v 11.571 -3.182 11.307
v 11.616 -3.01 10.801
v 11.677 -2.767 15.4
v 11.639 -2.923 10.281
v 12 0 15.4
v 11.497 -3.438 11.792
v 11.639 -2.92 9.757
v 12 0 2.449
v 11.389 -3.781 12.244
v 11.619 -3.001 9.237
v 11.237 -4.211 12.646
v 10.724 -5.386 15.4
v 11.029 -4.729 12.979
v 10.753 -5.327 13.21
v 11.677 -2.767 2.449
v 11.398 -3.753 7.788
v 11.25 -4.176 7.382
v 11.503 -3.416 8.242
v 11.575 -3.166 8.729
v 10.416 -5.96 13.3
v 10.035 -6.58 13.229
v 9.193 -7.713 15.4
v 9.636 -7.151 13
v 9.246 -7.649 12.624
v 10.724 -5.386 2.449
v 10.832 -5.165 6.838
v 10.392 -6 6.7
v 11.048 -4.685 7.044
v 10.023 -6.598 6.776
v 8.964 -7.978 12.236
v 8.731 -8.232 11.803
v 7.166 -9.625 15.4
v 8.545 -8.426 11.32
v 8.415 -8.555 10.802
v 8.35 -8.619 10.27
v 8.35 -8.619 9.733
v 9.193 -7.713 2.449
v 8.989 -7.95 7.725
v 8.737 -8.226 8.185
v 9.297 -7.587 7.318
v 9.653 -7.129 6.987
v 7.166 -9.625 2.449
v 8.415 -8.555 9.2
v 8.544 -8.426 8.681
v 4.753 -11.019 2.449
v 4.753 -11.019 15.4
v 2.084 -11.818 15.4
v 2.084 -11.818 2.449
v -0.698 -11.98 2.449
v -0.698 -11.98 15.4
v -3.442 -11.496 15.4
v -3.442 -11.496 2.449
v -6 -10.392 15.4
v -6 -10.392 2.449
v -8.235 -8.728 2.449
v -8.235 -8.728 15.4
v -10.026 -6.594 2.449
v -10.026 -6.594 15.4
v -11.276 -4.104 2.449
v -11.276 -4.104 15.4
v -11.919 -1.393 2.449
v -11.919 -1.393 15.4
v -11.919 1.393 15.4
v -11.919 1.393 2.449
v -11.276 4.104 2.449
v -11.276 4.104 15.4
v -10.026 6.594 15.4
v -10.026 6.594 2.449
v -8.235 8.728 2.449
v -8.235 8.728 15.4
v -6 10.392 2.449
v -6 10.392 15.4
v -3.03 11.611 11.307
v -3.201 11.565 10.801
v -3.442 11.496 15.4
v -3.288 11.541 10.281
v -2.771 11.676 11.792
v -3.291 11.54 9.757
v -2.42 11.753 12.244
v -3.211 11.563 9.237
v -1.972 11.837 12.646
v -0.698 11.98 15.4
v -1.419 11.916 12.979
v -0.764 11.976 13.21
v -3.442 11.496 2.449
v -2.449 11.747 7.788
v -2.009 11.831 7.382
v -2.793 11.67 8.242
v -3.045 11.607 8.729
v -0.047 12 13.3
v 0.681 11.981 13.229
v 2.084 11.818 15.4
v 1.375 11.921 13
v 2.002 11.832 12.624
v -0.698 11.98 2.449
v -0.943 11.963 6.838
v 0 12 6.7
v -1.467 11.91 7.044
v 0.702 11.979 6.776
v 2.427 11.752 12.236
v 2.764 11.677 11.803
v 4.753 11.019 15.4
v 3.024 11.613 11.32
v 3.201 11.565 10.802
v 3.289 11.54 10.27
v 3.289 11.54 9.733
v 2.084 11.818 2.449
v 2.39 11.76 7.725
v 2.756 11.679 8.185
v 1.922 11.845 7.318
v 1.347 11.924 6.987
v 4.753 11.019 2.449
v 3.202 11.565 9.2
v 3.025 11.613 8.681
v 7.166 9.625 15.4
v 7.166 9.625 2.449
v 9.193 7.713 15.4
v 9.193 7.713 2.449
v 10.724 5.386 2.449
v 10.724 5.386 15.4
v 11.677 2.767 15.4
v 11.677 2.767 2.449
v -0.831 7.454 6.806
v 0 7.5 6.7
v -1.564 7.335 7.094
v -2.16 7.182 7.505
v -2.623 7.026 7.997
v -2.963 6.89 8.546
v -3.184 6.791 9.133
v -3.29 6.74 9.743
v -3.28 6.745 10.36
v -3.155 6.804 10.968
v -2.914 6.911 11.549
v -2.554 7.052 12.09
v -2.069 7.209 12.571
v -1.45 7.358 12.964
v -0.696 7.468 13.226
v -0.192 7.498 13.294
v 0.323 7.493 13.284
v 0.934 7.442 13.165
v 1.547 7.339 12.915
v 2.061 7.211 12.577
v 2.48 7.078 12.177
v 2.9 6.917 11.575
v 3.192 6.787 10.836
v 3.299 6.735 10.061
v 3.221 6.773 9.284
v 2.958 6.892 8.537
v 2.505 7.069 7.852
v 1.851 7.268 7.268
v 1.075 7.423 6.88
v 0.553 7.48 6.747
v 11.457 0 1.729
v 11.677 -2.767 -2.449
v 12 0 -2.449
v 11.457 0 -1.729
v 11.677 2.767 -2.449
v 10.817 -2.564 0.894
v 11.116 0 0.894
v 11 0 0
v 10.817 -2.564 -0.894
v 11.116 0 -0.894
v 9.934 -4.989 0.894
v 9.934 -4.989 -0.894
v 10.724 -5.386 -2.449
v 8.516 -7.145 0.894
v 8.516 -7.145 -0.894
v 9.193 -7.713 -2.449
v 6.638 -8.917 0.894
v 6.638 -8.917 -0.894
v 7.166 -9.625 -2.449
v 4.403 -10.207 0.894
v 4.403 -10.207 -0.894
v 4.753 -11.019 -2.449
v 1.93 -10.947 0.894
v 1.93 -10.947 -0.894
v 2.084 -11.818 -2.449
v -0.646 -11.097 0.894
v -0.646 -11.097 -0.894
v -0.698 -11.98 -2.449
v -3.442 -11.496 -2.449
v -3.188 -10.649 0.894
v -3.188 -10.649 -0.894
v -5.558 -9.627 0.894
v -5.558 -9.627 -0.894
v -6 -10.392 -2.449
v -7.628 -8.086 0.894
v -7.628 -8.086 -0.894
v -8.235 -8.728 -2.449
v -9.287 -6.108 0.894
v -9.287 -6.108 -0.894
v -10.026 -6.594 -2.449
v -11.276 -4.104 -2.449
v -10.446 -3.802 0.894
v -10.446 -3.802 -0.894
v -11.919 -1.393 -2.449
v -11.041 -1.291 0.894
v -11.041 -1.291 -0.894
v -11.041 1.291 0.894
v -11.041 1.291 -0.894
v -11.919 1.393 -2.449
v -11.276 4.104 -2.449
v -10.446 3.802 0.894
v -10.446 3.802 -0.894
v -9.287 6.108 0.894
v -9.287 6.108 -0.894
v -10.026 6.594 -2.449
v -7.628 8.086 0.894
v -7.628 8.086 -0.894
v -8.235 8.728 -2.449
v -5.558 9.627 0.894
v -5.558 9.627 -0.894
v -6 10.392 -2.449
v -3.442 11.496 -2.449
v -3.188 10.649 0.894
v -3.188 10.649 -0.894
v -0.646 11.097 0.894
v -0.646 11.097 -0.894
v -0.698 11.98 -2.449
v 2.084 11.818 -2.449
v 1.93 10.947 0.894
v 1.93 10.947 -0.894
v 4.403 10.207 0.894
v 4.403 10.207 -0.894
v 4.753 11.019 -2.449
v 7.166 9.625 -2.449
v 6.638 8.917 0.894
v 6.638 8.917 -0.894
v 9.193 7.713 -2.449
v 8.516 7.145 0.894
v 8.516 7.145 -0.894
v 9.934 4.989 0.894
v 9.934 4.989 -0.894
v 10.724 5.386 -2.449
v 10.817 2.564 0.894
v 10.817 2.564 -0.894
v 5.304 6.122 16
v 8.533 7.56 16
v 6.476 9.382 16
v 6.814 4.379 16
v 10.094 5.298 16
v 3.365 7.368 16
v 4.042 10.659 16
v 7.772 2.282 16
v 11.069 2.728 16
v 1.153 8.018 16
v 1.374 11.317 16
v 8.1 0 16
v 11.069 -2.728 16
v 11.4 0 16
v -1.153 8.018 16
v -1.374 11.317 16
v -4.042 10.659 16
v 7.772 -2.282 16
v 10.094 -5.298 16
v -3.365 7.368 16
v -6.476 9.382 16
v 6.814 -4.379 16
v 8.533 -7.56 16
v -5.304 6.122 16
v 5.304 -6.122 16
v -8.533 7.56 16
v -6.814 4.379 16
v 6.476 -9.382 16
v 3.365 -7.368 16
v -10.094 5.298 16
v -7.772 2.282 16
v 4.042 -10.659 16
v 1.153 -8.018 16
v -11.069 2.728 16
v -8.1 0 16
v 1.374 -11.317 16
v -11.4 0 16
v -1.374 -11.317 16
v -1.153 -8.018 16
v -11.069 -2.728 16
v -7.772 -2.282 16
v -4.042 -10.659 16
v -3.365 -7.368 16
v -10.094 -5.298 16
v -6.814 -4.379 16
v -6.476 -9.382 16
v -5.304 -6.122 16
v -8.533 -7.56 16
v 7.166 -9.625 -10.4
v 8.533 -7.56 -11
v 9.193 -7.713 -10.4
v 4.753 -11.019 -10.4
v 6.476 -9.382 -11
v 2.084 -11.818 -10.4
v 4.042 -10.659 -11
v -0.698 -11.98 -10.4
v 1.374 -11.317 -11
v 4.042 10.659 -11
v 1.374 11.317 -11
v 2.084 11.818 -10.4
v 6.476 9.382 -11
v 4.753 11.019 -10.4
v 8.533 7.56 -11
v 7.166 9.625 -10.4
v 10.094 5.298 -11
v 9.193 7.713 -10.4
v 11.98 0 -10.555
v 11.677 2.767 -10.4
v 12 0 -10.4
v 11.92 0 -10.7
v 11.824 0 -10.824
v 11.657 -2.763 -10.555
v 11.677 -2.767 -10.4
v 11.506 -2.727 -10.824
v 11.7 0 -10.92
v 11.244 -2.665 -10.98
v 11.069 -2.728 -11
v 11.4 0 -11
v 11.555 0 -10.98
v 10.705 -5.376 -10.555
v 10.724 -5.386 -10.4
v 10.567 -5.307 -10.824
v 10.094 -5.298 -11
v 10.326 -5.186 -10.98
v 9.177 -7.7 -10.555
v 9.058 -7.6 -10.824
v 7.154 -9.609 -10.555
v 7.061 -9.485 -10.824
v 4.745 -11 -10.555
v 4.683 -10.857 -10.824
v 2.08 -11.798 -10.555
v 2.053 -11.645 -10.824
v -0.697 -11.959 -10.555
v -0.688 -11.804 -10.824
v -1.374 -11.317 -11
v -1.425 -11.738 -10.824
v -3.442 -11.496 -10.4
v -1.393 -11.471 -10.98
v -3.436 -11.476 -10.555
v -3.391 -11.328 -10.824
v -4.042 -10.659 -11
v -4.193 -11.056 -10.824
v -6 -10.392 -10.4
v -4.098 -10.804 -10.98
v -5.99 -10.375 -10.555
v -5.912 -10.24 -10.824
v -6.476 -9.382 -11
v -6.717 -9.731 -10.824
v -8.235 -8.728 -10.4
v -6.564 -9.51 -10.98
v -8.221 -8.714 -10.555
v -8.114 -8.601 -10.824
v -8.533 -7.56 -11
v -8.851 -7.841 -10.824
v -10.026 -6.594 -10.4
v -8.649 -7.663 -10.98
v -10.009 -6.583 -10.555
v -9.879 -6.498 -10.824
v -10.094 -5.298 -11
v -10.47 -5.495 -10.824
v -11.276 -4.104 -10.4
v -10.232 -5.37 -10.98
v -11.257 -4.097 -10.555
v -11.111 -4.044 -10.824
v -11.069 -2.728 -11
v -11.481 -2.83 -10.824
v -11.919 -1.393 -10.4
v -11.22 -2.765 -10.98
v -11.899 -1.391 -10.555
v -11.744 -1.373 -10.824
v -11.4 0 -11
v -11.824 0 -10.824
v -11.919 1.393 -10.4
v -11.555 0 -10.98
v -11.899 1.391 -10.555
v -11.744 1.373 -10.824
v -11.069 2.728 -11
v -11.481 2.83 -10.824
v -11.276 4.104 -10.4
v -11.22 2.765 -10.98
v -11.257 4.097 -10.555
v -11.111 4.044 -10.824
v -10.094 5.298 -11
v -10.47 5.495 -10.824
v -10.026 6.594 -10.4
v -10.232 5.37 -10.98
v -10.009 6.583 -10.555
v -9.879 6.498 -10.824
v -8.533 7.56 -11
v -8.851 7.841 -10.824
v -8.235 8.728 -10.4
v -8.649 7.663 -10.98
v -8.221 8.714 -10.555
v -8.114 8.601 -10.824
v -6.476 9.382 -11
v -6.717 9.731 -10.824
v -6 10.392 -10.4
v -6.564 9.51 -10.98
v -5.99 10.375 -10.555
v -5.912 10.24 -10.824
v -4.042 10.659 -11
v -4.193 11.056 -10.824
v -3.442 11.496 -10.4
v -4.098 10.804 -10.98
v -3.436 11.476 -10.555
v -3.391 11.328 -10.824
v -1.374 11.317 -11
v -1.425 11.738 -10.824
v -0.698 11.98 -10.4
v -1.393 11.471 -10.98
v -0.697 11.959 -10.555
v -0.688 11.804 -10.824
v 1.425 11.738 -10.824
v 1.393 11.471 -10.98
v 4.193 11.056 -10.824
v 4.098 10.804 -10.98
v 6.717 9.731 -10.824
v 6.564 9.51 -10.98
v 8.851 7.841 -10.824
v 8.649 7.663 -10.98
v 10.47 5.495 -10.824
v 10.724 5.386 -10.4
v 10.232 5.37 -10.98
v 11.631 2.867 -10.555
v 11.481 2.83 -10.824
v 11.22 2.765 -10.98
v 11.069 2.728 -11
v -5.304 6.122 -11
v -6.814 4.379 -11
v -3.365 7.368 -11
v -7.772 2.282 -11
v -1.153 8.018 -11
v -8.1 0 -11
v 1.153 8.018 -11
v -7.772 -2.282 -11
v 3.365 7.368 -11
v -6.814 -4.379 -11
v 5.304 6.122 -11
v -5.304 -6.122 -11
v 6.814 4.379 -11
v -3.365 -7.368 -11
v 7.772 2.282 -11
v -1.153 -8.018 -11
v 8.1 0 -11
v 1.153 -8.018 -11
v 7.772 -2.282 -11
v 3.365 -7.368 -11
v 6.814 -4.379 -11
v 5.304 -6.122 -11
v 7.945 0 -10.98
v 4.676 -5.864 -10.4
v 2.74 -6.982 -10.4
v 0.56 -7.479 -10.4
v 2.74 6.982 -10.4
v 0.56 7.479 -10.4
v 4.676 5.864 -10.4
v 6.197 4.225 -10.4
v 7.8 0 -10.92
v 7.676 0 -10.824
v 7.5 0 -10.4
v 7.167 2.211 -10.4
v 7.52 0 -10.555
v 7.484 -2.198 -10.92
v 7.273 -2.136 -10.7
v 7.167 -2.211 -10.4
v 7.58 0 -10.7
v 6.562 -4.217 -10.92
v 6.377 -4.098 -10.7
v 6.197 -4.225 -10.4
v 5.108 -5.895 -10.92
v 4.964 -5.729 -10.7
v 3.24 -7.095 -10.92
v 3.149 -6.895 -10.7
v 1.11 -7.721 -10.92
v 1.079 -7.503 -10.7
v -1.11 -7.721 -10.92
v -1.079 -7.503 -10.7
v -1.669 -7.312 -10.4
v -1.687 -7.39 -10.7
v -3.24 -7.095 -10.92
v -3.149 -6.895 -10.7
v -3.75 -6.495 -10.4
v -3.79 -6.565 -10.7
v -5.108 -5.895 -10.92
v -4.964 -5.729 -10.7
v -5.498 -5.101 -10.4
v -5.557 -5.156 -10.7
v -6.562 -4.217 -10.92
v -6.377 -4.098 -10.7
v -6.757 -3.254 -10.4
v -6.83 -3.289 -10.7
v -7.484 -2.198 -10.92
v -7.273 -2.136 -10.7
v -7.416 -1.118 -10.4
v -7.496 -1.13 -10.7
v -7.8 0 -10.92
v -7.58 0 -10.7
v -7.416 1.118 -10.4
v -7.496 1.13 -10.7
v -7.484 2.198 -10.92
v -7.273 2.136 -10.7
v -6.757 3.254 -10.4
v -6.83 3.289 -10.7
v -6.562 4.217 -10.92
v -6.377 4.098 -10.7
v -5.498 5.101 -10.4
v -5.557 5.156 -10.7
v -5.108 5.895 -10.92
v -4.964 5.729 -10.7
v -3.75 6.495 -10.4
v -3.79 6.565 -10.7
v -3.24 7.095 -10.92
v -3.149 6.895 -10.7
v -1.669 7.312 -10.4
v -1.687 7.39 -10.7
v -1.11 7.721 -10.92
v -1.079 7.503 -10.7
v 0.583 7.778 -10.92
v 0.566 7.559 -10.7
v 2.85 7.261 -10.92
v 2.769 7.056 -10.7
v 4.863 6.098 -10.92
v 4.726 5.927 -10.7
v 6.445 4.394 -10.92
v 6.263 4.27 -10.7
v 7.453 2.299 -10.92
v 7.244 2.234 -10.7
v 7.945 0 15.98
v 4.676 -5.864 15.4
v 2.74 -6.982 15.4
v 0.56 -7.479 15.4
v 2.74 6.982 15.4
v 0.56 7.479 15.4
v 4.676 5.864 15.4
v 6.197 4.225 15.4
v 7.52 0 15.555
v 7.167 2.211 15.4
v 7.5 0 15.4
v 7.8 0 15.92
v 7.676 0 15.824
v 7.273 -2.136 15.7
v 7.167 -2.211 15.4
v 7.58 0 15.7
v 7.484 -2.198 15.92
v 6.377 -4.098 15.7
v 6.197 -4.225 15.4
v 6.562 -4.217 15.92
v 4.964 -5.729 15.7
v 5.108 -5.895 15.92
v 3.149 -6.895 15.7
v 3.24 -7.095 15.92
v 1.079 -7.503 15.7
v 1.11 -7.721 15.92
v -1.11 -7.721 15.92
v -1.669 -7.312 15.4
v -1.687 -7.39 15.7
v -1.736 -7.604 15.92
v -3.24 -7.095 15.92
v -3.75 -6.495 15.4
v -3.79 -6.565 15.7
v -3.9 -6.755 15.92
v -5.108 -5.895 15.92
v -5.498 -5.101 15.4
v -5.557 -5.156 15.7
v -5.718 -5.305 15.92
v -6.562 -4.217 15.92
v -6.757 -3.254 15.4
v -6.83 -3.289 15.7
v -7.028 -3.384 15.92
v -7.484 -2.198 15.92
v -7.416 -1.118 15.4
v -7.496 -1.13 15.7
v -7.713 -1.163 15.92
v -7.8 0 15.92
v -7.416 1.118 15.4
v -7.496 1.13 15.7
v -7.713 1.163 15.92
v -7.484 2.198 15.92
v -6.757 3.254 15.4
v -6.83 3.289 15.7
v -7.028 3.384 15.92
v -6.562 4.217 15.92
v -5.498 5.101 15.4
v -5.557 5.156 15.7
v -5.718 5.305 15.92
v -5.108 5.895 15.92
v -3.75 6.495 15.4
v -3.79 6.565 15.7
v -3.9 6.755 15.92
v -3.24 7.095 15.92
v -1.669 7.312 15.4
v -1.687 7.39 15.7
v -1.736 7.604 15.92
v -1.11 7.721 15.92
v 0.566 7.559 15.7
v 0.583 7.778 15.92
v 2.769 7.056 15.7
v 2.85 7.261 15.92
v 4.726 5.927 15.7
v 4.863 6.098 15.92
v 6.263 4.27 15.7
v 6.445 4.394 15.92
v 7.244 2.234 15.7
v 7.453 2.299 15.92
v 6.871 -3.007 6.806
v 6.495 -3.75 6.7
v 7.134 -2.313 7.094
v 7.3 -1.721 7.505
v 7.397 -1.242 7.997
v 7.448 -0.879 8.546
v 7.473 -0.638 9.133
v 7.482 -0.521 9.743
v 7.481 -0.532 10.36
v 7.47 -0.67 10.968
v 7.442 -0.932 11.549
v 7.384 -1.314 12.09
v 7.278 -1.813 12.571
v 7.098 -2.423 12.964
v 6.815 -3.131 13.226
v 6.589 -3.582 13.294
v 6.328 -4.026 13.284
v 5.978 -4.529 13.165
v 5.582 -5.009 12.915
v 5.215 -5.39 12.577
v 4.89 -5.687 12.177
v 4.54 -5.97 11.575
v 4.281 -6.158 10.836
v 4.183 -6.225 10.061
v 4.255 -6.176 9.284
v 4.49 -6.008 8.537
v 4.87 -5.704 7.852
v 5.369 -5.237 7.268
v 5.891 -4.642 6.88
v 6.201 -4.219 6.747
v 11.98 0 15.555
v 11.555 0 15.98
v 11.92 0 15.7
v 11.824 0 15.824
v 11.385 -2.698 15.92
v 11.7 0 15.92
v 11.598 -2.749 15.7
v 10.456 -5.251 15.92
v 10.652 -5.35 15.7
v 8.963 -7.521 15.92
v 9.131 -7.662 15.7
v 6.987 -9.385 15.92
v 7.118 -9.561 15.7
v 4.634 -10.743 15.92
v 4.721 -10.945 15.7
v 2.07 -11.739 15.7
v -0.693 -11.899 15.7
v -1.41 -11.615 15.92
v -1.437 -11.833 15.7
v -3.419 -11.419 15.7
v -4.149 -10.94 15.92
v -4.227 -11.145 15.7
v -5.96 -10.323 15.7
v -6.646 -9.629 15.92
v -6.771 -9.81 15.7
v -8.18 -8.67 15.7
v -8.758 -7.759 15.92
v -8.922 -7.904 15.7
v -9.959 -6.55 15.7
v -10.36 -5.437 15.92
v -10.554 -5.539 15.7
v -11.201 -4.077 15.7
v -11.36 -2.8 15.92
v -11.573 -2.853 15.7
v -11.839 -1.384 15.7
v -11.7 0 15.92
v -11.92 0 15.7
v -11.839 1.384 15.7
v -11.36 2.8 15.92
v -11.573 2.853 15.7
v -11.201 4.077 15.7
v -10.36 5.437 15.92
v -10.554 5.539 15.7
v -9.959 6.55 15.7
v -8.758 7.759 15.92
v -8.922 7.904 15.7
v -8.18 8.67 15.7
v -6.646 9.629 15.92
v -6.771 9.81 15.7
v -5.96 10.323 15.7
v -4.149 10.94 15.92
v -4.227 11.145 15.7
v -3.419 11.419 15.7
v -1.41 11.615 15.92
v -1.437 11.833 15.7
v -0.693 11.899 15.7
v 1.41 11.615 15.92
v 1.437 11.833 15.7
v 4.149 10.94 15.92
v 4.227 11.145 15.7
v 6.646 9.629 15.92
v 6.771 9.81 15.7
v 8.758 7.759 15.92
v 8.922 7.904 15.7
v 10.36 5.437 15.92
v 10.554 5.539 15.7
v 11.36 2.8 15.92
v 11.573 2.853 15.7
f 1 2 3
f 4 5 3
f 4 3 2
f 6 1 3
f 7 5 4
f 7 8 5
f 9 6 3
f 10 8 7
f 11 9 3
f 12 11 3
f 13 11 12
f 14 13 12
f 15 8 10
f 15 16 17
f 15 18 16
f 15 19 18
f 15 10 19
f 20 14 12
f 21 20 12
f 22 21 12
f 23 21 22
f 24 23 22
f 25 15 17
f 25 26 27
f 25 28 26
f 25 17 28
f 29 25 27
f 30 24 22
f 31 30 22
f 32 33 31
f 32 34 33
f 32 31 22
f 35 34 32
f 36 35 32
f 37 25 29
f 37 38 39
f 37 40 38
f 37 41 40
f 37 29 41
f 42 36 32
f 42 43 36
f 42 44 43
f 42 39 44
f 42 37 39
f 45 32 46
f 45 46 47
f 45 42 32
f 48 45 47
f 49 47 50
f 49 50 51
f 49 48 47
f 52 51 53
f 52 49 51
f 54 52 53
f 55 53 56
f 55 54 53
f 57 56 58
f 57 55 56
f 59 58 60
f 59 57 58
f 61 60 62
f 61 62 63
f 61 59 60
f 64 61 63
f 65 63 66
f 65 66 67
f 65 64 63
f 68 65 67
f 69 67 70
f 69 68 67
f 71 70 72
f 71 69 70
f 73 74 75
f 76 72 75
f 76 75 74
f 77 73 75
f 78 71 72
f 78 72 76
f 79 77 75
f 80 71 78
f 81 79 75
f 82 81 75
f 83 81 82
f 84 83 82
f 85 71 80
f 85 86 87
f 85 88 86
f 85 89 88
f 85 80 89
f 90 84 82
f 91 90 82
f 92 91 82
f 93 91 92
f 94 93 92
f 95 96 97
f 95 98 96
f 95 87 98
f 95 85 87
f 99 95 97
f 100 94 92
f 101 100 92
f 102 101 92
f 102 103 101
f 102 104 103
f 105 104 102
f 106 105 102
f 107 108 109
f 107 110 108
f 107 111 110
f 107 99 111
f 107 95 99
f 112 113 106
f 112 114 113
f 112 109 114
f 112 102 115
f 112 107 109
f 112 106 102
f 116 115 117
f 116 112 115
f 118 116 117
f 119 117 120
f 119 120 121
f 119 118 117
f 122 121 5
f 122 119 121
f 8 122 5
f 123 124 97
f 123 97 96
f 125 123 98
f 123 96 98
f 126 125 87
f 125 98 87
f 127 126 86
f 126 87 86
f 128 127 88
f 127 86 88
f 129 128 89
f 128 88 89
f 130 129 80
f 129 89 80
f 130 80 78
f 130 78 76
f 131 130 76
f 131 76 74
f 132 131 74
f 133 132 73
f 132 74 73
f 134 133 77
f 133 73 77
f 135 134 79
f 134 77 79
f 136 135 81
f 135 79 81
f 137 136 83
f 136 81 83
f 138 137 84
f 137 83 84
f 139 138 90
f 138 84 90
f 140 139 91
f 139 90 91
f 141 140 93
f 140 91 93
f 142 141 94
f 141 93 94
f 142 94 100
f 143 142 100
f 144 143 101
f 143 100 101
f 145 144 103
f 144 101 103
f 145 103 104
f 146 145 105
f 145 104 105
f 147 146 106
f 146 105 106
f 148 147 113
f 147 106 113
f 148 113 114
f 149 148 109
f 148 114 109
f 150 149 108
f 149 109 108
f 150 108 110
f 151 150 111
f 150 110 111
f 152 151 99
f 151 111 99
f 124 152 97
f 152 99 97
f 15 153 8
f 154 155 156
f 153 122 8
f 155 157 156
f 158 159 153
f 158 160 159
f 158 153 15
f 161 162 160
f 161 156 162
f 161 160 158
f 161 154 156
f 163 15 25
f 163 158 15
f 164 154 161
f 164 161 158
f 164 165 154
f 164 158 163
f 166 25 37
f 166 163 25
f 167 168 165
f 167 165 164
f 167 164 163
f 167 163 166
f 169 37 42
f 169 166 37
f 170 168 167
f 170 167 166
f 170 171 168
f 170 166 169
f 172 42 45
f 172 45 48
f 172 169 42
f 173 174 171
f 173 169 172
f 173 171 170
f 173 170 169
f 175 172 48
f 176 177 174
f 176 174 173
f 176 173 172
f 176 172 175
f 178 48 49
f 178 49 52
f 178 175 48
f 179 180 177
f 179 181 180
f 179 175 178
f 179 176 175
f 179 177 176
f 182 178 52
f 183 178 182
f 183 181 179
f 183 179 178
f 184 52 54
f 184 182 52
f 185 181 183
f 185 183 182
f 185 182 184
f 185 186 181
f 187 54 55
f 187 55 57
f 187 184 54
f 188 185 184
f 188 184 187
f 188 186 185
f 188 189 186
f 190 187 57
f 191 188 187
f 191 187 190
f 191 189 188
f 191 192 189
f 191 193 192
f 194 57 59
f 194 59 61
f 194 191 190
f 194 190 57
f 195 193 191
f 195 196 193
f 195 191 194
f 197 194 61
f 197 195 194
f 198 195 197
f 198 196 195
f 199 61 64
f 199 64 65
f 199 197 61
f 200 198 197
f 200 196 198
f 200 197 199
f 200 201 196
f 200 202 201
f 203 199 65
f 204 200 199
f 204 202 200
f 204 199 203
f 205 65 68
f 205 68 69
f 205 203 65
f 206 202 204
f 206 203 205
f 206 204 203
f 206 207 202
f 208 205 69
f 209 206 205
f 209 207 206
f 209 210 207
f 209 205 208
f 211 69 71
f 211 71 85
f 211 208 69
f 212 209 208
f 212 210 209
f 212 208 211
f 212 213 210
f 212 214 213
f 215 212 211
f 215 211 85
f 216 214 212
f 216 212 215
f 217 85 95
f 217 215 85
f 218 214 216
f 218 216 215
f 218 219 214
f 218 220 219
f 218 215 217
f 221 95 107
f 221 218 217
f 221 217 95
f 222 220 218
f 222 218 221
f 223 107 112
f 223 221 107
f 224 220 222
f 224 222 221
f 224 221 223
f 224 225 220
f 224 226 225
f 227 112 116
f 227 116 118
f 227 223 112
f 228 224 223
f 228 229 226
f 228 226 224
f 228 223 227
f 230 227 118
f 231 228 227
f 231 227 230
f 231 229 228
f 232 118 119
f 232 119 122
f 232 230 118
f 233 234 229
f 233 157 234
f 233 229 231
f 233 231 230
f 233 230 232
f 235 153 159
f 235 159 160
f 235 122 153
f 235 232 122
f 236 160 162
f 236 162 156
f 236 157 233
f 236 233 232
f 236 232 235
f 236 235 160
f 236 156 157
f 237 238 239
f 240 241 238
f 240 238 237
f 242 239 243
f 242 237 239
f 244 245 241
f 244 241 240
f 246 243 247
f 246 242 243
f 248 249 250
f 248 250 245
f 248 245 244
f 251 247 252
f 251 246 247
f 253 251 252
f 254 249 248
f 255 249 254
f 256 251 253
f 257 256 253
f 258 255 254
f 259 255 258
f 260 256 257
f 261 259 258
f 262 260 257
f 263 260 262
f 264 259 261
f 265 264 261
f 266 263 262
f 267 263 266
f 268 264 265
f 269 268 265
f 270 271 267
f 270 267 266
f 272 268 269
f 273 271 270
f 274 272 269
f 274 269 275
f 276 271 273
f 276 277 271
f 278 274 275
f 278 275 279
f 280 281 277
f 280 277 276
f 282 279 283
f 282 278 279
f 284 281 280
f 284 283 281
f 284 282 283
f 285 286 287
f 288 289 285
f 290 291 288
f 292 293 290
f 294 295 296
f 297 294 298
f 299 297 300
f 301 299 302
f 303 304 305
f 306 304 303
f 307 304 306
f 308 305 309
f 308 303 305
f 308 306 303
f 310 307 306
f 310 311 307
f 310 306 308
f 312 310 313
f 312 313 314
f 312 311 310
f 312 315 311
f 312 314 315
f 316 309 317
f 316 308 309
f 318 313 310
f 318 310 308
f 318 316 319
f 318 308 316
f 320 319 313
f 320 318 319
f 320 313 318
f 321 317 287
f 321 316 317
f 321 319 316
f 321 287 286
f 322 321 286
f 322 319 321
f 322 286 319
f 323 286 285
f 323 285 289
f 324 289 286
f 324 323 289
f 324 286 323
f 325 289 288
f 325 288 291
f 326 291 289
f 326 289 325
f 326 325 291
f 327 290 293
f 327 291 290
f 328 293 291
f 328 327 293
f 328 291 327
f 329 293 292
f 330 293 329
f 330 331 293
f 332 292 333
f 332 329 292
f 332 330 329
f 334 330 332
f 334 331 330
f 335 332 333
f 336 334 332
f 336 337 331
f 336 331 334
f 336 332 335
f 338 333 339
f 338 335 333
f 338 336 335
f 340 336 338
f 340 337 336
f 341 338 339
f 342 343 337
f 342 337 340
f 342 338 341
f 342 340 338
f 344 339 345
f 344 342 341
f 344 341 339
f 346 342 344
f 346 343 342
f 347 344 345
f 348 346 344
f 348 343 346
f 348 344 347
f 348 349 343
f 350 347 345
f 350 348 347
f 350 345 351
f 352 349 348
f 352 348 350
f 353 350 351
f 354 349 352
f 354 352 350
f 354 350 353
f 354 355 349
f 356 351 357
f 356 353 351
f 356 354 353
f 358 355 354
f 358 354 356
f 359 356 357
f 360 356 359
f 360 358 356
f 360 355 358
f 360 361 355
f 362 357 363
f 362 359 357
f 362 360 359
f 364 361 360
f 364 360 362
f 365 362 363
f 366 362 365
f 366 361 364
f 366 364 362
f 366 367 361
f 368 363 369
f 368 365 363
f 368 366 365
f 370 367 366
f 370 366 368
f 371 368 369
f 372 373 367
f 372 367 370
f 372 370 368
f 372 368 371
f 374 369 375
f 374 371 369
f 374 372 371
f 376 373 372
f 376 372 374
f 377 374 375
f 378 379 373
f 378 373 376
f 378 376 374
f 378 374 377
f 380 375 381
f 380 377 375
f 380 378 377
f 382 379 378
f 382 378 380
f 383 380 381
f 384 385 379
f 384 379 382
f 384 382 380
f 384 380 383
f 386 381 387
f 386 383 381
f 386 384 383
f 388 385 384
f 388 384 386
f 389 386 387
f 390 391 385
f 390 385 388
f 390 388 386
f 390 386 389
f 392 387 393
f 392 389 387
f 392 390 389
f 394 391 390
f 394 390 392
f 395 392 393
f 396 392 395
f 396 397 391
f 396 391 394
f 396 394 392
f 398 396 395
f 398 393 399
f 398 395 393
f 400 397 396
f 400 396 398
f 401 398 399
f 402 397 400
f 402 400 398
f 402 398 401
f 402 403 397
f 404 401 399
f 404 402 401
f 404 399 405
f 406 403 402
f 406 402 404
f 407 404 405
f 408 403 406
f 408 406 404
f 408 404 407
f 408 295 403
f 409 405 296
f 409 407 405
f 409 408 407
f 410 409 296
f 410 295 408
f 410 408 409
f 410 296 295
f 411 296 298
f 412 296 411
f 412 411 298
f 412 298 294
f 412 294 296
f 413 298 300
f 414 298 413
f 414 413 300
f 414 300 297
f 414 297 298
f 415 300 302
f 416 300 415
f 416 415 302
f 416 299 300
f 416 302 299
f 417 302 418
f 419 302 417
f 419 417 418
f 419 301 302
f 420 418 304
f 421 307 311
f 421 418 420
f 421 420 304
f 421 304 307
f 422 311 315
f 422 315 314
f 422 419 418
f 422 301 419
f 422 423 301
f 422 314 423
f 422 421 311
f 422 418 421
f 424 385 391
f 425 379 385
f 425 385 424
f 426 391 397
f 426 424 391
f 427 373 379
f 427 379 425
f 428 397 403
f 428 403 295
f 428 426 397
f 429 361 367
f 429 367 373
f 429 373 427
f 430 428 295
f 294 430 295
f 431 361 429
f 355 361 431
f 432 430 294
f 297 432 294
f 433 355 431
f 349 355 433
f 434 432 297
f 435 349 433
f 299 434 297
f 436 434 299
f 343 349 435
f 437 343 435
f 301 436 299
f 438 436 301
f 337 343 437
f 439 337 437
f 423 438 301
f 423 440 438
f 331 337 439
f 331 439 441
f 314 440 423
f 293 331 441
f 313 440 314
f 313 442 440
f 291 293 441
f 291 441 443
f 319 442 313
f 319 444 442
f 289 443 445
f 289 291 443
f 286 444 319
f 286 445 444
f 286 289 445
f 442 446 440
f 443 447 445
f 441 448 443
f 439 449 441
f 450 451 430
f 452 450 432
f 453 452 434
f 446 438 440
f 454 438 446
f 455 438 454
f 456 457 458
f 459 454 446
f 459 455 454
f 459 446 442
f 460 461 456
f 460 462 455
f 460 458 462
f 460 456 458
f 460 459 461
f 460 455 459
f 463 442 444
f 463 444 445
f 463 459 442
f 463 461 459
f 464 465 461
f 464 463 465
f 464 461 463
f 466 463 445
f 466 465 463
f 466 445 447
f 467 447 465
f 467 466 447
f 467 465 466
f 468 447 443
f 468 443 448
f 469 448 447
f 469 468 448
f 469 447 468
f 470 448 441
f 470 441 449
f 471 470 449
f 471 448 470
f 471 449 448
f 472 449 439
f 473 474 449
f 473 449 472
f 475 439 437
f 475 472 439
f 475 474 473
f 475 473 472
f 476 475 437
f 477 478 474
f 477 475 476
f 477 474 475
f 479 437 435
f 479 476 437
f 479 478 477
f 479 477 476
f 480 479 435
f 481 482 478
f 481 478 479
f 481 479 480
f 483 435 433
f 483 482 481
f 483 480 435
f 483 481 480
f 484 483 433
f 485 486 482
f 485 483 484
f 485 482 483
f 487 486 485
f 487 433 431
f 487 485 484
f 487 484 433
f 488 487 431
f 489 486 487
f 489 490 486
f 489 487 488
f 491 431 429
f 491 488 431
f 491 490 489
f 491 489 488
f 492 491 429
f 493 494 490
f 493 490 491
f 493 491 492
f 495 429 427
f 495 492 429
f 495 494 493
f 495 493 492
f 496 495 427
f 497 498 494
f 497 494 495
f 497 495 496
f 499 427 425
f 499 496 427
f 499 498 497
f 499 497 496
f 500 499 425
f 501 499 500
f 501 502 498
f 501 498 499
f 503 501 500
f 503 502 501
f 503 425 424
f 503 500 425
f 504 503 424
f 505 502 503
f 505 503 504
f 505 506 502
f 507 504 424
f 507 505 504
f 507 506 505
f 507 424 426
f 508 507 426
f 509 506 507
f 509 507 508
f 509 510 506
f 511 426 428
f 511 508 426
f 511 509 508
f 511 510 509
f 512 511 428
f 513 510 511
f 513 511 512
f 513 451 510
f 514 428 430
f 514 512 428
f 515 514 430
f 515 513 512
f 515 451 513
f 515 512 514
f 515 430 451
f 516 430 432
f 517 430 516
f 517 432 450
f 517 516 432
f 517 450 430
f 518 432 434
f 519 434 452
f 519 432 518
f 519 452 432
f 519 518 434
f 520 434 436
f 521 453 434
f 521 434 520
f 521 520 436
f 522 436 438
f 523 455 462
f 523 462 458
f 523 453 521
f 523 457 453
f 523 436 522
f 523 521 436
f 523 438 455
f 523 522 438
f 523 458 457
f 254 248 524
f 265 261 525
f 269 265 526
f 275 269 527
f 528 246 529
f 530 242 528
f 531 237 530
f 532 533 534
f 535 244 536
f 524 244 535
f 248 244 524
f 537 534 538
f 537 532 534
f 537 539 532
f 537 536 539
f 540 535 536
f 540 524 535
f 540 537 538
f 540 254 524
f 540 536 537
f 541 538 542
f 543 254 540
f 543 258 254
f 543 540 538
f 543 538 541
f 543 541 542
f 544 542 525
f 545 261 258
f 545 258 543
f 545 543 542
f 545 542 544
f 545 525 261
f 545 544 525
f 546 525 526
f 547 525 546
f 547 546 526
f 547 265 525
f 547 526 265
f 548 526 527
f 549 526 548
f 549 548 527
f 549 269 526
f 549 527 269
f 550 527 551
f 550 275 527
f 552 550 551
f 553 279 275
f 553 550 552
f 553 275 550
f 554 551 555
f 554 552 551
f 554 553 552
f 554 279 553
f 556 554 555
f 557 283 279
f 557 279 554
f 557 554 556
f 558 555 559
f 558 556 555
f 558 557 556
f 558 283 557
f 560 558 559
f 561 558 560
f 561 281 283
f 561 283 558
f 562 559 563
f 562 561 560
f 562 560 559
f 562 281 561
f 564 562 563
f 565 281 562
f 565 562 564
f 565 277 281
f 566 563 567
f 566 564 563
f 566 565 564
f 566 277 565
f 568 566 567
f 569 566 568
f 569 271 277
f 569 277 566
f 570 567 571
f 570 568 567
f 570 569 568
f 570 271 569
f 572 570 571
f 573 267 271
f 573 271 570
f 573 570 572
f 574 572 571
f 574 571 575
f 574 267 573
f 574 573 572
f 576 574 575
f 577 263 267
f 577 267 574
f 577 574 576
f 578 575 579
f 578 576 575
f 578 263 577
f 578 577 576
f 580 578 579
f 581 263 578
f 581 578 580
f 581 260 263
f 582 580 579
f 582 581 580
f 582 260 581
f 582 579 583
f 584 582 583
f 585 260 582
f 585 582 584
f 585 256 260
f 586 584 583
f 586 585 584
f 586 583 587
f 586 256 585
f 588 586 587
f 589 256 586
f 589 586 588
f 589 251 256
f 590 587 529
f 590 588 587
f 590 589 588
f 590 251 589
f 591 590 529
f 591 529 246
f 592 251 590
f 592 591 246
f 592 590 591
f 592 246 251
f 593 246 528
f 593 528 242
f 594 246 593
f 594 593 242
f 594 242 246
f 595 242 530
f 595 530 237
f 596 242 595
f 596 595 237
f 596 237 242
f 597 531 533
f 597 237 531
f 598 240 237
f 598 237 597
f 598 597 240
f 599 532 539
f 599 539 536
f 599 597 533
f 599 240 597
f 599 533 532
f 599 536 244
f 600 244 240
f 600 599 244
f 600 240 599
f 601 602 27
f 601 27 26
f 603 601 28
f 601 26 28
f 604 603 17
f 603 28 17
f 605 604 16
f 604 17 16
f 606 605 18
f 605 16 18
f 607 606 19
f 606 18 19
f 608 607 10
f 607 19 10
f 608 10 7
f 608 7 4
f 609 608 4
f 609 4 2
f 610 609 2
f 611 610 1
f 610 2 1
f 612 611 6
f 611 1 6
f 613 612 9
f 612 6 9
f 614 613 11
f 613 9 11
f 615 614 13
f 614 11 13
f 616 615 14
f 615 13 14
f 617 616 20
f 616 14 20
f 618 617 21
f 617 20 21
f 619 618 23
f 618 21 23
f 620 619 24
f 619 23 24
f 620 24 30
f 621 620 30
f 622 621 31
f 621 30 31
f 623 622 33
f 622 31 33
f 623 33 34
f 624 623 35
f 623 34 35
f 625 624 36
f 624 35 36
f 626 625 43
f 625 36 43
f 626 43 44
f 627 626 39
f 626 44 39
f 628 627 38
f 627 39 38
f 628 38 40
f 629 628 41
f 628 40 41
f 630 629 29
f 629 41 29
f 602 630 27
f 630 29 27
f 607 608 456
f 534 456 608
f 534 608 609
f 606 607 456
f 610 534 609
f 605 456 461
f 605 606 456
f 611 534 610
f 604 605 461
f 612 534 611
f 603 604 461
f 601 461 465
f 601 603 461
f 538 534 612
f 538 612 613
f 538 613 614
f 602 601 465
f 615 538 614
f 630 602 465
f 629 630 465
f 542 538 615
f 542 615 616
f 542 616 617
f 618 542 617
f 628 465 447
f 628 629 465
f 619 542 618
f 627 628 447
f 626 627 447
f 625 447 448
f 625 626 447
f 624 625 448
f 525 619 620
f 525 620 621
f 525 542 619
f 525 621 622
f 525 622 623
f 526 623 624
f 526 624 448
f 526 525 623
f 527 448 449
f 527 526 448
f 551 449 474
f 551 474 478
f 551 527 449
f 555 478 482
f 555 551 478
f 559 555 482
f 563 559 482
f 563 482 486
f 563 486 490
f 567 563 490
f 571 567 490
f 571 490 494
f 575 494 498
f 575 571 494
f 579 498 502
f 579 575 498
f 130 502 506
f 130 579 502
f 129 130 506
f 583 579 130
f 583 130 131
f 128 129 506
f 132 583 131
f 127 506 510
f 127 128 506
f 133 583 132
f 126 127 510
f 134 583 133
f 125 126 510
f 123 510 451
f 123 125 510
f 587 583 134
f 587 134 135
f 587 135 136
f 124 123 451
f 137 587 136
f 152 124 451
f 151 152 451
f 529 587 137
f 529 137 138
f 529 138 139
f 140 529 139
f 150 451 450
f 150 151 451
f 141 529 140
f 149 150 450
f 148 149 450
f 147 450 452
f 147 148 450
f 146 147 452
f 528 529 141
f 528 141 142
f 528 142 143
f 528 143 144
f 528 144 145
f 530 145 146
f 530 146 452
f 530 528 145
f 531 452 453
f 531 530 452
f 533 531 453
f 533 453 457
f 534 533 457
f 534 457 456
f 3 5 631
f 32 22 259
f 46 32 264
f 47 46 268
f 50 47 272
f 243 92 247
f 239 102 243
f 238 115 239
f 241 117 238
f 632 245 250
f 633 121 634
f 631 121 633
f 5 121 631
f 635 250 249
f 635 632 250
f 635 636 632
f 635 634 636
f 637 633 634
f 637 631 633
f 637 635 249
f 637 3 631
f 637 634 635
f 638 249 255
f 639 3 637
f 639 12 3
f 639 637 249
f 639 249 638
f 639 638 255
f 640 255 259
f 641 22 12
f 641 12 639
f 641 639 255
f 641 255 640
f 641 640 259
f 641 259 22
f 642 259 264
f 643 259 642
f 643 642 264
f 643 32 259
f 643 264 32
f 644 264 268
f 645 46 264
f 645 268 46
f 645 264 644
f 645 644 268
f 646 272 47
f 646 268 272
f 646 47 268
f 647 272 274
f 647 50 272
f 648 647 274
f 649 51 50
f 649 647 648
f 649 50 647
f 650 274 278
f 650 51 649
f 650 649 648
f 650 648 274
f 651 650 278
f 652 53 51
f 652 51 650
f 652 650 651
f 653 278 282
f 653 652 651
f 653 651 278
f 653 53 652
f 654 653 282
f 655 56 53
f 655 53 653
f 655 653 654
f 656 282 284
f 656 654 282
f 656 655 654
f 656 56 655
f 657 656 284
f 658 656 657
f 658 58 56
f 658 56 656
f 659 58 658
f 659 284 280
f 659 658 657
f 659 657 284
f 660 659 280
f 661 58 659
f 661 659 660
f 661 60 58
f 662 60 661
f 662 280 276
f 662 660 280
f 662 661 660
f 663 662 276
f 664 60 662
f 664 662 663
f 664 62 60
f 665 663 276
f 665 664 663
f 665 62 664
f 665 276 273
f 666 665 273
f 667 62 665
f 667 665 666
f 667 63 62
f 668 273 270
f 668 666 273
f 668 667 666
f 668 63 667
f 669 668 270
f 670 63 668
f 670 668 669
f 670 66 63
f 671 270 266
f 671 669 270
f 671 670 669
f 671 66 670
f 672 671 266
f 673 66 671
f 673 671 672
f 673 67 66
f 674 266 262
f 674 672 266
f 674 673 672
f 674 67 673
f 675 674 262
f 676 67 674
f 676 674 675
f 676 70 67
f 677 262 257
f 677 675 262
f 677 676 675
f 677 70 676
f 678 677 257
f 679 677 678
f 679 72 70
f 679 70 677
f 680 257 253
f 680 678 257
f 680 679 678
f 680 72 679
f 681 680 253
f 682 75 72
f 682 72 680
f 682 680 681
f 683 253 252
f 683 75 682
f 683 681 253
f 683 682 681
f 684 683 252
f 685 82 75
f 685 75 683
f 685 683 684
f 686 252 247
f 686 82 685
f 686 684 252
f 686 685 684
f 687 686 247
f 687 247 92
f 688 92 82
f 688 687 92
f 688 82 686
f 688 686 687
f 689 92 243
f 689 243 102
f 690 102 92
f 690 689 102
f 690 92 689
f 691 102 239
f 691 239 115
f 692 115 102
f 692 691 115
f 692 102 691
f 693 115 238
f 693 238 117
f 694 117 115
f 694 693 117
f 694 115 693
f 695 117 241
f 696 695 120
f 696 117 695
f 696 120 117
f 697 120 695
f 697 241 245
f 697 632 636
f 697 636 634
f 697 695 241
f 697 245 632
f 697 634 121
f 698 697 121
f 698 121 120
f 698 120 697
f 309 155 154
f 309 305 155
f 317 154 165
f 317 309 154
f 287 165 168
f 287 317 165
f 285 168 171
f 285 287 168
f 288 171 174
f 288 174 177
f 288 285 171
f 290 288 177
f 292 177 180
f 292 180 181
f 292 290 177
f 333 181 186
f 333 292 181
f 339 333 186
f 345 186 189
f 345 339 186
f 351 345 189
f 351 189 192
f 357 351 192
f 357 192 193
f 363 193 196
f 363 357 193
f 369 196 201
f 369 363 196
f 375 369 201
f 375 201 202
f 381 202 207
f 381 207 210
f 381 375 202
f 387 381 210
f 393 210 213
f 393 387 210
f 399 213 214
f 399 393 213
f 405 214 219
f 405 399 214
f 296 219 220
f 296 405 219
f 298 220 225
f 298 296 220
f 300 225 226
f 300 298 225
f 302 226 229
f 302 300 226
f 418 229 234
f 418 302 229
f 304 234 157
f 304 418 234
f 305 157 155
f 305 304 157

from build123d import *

# Parameters (mm, degrees)
ESQUISSE2_W                  = 3.3
ESQUISSE2_H                  = 16.393670871
R_P_TITION_CIRCULAIRE1_COUNT = 2
R_P_TITION_CIRCULAIRE1_ANGLE = 120


with BuildPart() as part:
    # Esquisse1 → Révolution1 (revolve)
    with BuildSketch(Plane(origin=(0, 0, 0), x_dir=(0, 0, -1), z_dir=(1, 0, 0)), mode=Mode.PRIVATE) as r_volution1_sk:
        with BuildLine():
            Line((2.449489743, 12), (10.4, 12))
            ThreePointArc((10.4, 12), (10.824264069, 11.824264069), (11, 11.4))
            Line((11, 11.4), (11, 8.1))
            ThreePointArc((11, 8.1), (10.824264069, 7.675735931), (10.4, 7.5))
            Line((10.4, 7.5), (-15.4, 7.5))
            ThreePointArc((-15.4, 7.5), (-15.824264069, 7.675735931), (-16, 8.1))
            Line((-16, 8.1), (-16, 11.4))
            ThreePointArc((-16, 11.4), (-15.824264069, 11.824264069), (-15.4, 12))
            Line((-15.4, 12), (-2.449489743, 12))
            ThreePointArc((-2.449489743, 12), (0, 11), (2.449489743, 12))
        make_face()
    revolve(r_volution1_sk.sketch.rotate(Axis((0, 0, 2.449489743), (0, 0, -1)), 90), axis=Axis((0, 0, 2.449489743), (0, 0, -1)))

    # Esquisse2 → Dégagement M61 (revolve, cut)
    with BuildSketch(Plane(origin=(0, 0, 10), x_dir=(0, 0, -1), z_dir=(1, 0, 0))):
        with Locations((1.65, 8.196835436)):
            Rectangle(ESQUISSE2_W, ESQUISSE2_H)
    d_gagement_m61 = revolve(axis=Axis((0, -6.35, 10), (0, 1, 0)), mode=Mode.SUBTRACT)

    # Répétition circulaire1: Dégagement M61 ×2 about axis
    r_p_tition_circulaire1_axis = Axis((0, 0, 2.449489743), (0, 0, -1))
    for i in range(1, R_P_TITION_CIRCULAIRE1_COUNT):
        add(d_gagement_m61.rotate(r_p_tition_circulaire1_axis, i * R_P_TITION_CIRCULAIRE1_ANGLE / (R_P_TITION_CIRCULAIRE1_COUNT - 1)), mode=Mode.SUBTRACT)


solid = part.part
